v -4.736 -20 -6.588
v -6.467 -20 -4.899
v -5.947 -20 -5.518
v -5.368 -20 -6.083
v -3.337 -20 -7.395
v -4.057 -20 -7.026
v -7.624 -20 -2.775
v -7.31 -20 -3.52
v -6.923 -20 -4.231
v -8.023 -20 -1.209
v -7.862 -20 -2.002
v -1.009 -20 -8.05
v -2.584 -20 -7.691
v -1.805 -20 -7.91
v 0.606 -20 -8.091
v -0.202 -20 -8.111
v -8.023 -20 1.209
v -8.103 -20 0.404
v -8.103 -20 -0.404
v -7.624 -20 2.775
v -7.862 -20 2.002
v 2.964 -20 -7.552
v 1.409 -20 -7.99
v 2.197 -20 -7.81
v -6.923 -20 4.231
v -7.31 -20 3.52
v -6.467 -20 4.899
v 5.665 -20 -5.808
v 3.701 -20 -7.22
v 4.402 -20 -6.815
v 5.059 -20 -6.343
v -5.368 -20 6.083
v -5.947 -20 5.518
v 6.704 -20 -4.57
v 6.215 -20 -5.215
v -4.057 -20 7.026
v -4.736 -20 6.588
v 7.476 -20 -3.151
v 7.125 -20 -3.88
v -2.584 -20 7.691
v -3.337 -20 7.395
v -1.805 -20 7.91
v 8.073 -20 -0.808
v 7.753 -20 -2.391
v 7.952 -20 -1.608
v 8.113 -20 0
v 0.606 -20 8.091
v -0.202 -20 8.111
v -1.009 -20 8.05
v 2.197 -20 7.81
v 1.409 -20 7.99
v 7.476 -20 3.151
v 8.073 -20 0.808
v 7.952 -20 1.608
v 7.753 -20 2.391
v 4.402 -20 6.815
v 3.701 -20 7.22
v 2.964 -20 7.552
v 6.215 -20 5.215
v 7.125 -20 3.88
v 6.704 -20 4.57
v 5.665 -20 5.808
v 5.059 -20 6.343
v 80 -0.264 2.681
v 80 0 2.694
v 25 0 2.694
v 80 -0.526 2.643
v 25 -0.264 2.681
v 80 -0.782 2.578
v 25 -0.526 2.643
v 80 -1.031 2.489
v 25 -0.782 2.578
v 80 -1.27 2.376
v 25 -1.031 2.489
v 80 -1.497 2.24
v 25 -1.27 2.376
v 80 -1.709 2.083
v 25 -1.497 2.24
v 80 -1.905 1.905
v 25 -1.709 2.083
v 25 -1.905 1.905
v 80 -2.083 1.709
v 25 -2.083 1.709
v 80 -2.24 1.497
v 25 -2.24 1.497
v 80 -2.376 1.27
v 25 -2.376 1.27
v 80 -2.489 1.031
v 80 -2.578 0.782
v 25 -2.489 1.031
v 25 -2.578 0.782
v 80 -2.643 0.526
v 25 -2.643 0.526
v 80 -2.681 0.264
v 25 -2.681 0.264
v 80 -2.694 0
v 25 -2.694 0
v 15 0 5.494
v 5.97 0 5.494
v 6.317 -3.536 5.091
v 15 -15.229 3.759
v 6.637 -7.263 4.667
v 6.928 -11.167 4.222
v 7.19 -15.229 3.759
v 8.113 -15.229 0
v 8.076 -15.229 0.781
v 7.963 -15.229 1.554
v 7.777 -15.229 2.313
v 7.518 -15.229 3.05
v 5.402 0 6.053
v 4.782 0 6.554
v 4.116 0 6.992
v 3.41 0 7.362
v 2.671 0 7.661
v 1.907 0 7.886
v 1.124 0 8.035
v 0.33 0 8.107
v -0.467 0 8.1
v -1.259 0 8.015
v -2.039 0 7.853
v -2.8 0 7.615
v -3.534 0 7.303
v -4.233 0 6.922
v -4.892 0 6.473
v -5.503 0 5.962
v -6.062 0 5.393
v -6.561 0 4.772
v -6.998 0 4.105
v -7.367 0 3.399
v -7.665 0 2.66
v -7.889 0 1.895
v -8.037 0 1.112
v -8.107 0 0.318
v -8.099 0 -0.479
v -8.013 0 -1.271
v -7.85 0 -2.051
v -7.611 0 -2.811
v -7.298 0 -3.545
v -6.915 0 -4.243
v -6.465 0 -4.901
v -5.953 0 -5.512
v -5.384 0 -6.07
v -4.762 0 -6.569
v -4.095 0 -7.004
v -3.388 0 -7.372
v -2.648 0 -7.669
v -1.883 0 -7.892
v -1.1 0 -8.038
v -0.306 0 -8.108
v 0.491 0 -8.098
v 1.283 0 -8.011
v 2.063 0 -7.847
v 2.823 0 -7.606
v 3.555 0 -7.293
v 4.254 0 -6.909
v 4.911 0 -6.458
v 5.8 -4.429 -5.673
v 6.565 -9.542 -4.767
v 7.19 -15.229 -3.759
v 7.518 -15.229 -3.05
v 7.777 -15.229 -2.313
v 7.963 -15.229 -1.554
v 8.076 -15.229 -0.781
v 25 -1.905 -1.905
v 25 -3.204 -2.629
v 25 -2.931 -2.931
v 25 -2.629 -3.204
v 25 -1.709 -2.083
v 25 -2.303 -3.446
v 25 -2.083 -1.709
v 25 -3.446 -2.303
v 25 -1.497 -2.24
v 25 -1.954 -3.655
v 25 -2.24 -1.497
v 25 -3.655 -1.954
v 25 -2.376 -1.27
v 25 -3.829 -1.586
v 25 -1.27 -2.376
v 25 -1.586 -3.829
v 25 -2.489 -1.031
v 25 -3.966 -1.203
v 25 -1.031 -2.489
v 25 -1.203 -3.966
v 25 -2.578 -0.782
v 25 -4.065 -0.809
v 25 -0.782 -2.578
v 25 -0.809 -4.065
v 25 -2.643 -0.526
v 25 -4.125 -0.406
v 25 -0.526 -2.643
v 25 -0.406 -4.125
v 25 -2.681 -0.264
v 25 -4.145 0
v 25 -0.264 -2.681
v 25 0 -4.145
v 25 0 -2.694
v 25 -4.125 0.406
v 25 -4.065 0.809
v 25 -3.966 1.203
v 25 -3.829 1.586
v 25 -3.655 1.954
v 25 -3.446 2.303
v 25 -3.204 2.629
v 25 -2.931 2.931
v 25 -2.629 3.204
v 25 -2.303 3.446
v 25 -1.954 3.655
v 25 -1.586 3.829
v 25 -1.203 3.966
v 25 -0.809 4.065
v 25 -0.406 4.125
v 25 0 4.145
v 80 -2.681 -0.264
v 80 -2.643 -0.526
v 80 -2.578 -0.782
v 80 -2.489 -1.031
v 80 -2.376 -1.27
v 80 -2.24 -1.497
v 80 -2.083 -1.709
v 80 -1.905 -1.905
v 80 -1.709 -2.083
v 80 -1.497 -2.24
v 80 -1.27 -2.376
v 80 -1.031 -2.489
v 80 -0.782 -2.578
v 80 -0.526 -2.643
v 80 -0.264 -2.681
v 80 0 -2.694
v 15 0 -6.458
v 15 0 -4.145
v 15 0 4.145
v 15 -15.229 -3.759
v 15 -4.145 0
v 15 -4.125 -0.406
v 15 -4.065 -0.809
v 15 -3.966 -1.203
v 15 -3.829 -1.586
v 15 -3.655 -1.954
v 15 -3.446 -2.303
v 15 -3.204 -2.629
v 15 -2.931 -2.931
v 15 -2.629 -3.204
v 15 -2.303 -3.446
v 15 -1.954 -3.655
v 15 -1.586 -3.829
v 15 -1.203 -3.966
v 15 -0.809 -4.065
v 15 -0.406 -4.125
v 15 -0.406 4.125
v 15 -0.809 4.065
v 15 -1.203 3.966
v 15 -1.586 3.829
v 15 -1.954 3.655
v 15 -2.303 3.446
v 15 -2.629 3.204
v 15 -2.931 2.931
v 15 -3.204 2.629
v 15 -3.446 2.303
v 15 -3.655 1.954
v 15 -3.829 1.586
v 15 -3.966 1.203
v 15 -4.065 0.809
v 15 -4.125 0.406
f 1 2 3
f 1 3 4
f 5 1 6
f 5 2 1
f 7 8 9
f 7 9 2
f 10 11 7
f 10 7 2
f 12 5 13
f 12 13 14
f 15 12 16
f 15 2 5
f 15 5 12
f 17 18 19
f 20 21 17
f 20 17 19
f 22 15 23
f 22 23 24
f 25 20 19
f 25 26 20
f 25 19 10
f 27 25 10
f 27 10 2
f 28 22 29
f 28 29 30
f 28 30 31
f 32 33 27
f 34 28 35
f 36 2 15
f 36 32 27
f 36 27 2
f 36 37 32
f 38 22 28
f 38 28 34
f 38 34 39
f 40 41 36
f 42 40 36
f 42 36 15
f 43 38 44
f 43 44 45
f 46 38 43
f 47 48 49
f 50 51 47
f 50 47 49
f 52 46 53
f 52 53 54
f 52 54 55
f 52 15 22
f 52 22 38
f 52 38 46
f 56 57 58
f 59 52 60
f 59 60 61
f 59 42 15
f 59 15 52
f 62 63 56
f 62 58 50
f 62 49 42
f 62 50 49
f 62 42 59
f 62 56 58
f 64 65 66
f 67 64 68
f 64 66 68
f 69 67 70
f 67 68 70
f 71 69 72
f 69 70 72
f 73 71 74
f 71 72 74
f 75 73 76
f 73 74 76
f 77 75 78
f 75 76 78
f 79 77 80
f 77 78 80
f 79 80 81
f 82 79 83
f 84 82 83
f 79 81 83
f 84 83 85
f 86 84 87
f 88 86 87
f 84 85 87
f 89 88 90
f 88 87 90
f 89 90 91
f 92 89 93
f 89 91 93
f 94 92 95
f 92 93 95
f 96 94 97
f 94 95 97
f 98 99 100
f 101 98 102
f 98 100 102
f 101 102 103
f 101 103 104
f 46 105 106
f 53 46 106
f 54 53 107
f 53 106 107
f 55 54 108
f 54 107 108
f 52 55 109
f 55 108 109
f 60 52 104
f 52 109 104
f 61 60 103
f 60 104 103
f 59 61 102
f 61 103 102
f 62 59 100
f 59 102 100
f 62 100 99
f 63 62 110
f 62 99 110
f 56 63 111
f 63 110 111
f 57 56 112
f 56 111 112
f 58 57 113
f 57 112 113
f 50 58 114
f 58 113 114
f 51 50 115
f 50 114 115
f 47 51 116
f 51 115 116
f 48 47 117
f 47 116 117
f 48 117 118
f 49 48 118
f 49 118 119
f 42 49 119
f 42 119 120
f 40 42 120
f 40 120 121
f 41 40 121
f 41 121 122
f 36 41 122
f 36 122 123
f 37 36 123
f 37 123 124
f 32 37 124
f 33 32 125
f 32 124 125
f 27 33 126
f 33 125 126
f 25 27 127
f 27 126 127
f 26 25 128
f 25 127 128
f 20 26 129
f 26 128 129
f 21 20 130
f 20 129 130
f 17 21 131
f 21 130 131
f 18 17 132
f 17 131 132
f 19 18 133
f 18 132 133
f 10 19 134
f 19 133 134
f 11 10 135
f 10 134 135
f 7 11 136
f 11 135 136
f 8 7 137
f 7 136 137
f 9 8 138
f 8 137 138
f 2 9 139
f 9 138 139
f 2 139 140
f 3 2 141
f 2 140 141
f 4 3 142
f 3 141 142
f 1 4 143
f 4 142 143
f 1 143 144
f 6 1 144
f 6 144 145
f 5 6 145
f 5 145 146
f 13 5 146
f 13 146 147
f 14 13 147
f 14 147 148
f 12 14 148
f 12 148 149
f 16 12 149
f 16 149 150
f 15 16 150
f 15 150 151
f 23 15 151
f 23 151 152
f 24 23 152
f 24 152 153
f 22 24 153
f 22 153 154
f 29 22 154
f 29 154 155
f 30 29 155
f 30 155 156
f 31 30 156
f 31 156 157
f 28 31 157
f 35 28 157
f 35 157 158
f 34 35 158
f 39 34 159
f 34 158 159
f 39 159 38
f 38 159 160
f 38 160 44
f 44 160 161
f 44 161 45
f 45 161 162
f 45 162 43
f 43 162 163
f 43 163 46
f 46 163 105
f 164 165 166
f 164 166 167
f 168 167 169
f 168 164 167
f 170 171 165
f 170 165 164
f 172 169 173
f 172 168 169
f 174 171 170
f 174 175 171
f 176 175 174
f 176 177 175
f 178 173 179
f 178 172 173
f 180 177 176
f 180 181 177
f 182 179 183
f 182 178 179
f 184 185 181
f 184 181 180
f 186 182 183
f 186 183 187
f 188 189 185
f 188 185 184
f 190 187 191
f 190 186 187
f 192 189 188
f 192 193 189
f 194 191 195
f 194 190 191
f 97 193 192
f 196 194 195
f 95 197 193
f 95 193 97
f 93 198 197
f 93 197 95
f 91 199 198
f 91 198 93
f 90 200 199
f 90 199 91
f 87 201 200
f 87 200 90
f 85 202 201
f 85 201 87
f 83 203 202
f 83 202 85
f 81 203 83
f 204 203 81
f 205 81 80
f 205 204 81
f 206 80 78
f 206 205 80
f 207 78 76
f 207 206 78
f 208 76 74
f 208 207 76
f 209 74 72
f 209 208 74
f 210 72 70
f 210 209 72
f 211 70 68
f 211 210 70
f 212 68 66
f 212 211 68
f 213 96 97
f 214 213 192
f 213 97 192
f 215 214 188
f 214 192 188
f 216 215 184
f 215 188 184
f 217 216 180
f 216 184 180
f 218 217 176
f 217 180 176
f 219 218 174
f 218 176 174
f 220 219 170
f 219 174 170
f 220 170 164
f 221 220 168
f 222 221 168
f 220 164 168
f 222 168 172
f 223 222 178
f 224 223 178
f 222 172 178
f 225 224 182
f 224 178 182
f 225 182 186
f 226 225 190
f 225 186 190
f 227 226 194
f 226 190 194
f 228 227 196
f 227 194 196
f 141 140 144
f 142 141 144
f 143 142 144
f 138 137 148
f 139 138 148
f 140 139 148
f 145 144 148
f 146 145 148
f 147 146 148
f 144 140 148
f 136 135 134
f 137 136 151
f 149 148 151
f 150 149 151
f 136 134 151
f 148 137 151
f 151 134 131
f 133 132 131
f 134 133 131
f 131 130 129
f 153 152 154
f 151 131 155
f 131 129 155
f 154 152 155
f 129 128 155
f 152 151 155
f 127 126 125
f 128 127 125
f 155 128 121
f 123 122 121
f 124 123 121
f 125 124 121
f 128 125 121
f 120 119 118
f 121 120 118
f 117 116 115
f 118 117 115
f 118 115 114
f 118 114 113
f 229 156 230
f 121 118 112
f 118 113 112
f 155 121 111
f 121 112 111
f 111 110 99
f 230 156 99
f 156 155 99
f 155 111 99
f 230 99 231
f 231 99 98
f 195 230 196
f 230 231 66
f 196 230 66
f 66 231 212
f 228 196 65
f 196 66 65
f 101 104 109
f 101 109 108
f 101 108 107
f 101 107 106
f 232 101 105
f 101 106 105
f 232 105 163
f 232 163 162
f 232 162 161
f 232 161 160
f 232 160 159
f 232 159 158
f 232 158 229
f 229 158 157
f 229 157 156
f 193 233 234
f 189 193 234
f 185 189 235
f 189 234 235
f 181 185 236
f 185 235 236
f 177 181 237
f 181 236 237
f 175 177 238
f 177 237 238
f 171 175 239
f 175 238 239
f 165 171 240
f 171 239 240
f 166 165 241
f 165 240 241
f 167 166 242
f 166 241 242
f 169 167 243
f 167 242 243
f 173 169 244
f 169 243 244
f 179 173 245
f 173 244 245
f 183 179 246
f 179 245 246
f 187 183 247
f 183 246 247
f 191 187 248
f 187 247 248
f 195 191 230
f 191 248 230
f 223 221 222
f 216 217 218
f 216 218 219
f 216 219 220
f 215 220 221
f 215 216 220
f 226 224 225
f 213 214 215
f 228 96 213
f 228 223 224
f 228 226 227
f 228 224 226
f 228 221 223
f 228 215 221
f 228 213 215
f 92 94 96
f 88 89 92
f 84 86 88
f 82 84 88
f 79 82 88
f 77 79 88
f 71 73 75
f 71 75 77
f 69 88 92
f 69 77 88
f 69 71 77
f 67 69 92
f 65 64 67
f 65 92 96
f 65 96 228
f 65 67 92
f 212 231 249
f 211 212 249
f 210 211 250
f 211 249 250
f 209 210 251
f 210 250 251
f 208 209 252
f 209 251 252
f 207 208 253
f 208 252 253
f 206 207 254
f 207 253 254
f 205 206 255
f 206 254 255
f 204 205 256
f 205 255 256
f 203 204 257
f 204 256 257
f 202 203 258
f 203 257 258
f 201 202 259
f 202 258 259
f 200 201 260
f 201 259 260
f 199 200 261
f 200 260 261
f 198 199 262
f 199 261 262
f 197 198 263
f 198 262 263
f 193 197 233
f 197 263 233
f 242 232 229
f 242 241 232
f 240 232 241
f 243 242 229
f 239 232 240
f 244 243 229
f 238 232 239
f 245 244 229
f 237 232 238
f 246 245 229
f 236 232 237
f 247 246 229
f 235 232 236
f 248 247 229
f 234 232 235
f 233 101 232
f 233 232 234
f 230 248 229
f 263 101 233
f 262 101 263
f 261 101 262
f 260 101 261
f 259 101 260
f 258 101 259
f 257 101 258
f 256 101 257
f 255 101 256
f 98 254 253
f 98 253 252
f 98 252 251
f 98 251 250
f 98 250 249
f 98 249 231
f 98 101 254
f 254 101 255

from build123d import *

# Parameters (mm, degrees)
F0_R     = 8.1133177019
F1_DEPTH = 20
F3_DEPTH = 15
F5_DEPTH = 25
F7_DEPTH = 80


# Not quite as in the source:
# - a feature names something its author has since deleted; it is built from what else it names


with BuildPart() as f1:
    # F0 (on Front) → F1 (new body)
    with BuildSketch(Plane.XZ):
        Circle(F0_R)
    extrude(amount=F1_DEPTH)

    # F2 (on Right) → F3 (join)
    with BuildSketch(Plane.YZ):
        Polygon((0, -6.4580785111), (0, 5.4941866547), (-15.2294980362, 3.7591799628), (-15.2294980362, -3.7591799628), align=None)
    extrude(amount=F3_DEPTH)

    # F4 (on Right) → F5 (join)
    with BuildSketch(Plane.YZ):
        with BuildLine():
            ThreePointArc((-4.1447370313, 0), (-2.9307716611, -2.9307716611), (0, -4.1447370313))
            Line((0, -4.1447370313), (0, 4.1447370313))
            ThreePointArc((0, 4.1447370313), (-2.9307716611, 2.9307716611), (-4.1447370313, 0))
        make_face()
    extrude(amount=F5_DEPTH)

    # F6 (on Right) → F7 (join)
    with BuildSketch(Plane.YZ):
        with BuildLine():
            ThreePointArc((-2.6943630073, 0), (-1.9052023535, -1.9052023535), (0, -2.6943630073))
            Line((0, -2.6943630073), (0, 2.6943630073))
            ThreePointArc((0, 2.6943630073), (-1.9052023535, 1.9052023535), (-2.6943630073, 0))
        make_face()
    extrude(amount=F7_DEPTH)


solid = f1.part
